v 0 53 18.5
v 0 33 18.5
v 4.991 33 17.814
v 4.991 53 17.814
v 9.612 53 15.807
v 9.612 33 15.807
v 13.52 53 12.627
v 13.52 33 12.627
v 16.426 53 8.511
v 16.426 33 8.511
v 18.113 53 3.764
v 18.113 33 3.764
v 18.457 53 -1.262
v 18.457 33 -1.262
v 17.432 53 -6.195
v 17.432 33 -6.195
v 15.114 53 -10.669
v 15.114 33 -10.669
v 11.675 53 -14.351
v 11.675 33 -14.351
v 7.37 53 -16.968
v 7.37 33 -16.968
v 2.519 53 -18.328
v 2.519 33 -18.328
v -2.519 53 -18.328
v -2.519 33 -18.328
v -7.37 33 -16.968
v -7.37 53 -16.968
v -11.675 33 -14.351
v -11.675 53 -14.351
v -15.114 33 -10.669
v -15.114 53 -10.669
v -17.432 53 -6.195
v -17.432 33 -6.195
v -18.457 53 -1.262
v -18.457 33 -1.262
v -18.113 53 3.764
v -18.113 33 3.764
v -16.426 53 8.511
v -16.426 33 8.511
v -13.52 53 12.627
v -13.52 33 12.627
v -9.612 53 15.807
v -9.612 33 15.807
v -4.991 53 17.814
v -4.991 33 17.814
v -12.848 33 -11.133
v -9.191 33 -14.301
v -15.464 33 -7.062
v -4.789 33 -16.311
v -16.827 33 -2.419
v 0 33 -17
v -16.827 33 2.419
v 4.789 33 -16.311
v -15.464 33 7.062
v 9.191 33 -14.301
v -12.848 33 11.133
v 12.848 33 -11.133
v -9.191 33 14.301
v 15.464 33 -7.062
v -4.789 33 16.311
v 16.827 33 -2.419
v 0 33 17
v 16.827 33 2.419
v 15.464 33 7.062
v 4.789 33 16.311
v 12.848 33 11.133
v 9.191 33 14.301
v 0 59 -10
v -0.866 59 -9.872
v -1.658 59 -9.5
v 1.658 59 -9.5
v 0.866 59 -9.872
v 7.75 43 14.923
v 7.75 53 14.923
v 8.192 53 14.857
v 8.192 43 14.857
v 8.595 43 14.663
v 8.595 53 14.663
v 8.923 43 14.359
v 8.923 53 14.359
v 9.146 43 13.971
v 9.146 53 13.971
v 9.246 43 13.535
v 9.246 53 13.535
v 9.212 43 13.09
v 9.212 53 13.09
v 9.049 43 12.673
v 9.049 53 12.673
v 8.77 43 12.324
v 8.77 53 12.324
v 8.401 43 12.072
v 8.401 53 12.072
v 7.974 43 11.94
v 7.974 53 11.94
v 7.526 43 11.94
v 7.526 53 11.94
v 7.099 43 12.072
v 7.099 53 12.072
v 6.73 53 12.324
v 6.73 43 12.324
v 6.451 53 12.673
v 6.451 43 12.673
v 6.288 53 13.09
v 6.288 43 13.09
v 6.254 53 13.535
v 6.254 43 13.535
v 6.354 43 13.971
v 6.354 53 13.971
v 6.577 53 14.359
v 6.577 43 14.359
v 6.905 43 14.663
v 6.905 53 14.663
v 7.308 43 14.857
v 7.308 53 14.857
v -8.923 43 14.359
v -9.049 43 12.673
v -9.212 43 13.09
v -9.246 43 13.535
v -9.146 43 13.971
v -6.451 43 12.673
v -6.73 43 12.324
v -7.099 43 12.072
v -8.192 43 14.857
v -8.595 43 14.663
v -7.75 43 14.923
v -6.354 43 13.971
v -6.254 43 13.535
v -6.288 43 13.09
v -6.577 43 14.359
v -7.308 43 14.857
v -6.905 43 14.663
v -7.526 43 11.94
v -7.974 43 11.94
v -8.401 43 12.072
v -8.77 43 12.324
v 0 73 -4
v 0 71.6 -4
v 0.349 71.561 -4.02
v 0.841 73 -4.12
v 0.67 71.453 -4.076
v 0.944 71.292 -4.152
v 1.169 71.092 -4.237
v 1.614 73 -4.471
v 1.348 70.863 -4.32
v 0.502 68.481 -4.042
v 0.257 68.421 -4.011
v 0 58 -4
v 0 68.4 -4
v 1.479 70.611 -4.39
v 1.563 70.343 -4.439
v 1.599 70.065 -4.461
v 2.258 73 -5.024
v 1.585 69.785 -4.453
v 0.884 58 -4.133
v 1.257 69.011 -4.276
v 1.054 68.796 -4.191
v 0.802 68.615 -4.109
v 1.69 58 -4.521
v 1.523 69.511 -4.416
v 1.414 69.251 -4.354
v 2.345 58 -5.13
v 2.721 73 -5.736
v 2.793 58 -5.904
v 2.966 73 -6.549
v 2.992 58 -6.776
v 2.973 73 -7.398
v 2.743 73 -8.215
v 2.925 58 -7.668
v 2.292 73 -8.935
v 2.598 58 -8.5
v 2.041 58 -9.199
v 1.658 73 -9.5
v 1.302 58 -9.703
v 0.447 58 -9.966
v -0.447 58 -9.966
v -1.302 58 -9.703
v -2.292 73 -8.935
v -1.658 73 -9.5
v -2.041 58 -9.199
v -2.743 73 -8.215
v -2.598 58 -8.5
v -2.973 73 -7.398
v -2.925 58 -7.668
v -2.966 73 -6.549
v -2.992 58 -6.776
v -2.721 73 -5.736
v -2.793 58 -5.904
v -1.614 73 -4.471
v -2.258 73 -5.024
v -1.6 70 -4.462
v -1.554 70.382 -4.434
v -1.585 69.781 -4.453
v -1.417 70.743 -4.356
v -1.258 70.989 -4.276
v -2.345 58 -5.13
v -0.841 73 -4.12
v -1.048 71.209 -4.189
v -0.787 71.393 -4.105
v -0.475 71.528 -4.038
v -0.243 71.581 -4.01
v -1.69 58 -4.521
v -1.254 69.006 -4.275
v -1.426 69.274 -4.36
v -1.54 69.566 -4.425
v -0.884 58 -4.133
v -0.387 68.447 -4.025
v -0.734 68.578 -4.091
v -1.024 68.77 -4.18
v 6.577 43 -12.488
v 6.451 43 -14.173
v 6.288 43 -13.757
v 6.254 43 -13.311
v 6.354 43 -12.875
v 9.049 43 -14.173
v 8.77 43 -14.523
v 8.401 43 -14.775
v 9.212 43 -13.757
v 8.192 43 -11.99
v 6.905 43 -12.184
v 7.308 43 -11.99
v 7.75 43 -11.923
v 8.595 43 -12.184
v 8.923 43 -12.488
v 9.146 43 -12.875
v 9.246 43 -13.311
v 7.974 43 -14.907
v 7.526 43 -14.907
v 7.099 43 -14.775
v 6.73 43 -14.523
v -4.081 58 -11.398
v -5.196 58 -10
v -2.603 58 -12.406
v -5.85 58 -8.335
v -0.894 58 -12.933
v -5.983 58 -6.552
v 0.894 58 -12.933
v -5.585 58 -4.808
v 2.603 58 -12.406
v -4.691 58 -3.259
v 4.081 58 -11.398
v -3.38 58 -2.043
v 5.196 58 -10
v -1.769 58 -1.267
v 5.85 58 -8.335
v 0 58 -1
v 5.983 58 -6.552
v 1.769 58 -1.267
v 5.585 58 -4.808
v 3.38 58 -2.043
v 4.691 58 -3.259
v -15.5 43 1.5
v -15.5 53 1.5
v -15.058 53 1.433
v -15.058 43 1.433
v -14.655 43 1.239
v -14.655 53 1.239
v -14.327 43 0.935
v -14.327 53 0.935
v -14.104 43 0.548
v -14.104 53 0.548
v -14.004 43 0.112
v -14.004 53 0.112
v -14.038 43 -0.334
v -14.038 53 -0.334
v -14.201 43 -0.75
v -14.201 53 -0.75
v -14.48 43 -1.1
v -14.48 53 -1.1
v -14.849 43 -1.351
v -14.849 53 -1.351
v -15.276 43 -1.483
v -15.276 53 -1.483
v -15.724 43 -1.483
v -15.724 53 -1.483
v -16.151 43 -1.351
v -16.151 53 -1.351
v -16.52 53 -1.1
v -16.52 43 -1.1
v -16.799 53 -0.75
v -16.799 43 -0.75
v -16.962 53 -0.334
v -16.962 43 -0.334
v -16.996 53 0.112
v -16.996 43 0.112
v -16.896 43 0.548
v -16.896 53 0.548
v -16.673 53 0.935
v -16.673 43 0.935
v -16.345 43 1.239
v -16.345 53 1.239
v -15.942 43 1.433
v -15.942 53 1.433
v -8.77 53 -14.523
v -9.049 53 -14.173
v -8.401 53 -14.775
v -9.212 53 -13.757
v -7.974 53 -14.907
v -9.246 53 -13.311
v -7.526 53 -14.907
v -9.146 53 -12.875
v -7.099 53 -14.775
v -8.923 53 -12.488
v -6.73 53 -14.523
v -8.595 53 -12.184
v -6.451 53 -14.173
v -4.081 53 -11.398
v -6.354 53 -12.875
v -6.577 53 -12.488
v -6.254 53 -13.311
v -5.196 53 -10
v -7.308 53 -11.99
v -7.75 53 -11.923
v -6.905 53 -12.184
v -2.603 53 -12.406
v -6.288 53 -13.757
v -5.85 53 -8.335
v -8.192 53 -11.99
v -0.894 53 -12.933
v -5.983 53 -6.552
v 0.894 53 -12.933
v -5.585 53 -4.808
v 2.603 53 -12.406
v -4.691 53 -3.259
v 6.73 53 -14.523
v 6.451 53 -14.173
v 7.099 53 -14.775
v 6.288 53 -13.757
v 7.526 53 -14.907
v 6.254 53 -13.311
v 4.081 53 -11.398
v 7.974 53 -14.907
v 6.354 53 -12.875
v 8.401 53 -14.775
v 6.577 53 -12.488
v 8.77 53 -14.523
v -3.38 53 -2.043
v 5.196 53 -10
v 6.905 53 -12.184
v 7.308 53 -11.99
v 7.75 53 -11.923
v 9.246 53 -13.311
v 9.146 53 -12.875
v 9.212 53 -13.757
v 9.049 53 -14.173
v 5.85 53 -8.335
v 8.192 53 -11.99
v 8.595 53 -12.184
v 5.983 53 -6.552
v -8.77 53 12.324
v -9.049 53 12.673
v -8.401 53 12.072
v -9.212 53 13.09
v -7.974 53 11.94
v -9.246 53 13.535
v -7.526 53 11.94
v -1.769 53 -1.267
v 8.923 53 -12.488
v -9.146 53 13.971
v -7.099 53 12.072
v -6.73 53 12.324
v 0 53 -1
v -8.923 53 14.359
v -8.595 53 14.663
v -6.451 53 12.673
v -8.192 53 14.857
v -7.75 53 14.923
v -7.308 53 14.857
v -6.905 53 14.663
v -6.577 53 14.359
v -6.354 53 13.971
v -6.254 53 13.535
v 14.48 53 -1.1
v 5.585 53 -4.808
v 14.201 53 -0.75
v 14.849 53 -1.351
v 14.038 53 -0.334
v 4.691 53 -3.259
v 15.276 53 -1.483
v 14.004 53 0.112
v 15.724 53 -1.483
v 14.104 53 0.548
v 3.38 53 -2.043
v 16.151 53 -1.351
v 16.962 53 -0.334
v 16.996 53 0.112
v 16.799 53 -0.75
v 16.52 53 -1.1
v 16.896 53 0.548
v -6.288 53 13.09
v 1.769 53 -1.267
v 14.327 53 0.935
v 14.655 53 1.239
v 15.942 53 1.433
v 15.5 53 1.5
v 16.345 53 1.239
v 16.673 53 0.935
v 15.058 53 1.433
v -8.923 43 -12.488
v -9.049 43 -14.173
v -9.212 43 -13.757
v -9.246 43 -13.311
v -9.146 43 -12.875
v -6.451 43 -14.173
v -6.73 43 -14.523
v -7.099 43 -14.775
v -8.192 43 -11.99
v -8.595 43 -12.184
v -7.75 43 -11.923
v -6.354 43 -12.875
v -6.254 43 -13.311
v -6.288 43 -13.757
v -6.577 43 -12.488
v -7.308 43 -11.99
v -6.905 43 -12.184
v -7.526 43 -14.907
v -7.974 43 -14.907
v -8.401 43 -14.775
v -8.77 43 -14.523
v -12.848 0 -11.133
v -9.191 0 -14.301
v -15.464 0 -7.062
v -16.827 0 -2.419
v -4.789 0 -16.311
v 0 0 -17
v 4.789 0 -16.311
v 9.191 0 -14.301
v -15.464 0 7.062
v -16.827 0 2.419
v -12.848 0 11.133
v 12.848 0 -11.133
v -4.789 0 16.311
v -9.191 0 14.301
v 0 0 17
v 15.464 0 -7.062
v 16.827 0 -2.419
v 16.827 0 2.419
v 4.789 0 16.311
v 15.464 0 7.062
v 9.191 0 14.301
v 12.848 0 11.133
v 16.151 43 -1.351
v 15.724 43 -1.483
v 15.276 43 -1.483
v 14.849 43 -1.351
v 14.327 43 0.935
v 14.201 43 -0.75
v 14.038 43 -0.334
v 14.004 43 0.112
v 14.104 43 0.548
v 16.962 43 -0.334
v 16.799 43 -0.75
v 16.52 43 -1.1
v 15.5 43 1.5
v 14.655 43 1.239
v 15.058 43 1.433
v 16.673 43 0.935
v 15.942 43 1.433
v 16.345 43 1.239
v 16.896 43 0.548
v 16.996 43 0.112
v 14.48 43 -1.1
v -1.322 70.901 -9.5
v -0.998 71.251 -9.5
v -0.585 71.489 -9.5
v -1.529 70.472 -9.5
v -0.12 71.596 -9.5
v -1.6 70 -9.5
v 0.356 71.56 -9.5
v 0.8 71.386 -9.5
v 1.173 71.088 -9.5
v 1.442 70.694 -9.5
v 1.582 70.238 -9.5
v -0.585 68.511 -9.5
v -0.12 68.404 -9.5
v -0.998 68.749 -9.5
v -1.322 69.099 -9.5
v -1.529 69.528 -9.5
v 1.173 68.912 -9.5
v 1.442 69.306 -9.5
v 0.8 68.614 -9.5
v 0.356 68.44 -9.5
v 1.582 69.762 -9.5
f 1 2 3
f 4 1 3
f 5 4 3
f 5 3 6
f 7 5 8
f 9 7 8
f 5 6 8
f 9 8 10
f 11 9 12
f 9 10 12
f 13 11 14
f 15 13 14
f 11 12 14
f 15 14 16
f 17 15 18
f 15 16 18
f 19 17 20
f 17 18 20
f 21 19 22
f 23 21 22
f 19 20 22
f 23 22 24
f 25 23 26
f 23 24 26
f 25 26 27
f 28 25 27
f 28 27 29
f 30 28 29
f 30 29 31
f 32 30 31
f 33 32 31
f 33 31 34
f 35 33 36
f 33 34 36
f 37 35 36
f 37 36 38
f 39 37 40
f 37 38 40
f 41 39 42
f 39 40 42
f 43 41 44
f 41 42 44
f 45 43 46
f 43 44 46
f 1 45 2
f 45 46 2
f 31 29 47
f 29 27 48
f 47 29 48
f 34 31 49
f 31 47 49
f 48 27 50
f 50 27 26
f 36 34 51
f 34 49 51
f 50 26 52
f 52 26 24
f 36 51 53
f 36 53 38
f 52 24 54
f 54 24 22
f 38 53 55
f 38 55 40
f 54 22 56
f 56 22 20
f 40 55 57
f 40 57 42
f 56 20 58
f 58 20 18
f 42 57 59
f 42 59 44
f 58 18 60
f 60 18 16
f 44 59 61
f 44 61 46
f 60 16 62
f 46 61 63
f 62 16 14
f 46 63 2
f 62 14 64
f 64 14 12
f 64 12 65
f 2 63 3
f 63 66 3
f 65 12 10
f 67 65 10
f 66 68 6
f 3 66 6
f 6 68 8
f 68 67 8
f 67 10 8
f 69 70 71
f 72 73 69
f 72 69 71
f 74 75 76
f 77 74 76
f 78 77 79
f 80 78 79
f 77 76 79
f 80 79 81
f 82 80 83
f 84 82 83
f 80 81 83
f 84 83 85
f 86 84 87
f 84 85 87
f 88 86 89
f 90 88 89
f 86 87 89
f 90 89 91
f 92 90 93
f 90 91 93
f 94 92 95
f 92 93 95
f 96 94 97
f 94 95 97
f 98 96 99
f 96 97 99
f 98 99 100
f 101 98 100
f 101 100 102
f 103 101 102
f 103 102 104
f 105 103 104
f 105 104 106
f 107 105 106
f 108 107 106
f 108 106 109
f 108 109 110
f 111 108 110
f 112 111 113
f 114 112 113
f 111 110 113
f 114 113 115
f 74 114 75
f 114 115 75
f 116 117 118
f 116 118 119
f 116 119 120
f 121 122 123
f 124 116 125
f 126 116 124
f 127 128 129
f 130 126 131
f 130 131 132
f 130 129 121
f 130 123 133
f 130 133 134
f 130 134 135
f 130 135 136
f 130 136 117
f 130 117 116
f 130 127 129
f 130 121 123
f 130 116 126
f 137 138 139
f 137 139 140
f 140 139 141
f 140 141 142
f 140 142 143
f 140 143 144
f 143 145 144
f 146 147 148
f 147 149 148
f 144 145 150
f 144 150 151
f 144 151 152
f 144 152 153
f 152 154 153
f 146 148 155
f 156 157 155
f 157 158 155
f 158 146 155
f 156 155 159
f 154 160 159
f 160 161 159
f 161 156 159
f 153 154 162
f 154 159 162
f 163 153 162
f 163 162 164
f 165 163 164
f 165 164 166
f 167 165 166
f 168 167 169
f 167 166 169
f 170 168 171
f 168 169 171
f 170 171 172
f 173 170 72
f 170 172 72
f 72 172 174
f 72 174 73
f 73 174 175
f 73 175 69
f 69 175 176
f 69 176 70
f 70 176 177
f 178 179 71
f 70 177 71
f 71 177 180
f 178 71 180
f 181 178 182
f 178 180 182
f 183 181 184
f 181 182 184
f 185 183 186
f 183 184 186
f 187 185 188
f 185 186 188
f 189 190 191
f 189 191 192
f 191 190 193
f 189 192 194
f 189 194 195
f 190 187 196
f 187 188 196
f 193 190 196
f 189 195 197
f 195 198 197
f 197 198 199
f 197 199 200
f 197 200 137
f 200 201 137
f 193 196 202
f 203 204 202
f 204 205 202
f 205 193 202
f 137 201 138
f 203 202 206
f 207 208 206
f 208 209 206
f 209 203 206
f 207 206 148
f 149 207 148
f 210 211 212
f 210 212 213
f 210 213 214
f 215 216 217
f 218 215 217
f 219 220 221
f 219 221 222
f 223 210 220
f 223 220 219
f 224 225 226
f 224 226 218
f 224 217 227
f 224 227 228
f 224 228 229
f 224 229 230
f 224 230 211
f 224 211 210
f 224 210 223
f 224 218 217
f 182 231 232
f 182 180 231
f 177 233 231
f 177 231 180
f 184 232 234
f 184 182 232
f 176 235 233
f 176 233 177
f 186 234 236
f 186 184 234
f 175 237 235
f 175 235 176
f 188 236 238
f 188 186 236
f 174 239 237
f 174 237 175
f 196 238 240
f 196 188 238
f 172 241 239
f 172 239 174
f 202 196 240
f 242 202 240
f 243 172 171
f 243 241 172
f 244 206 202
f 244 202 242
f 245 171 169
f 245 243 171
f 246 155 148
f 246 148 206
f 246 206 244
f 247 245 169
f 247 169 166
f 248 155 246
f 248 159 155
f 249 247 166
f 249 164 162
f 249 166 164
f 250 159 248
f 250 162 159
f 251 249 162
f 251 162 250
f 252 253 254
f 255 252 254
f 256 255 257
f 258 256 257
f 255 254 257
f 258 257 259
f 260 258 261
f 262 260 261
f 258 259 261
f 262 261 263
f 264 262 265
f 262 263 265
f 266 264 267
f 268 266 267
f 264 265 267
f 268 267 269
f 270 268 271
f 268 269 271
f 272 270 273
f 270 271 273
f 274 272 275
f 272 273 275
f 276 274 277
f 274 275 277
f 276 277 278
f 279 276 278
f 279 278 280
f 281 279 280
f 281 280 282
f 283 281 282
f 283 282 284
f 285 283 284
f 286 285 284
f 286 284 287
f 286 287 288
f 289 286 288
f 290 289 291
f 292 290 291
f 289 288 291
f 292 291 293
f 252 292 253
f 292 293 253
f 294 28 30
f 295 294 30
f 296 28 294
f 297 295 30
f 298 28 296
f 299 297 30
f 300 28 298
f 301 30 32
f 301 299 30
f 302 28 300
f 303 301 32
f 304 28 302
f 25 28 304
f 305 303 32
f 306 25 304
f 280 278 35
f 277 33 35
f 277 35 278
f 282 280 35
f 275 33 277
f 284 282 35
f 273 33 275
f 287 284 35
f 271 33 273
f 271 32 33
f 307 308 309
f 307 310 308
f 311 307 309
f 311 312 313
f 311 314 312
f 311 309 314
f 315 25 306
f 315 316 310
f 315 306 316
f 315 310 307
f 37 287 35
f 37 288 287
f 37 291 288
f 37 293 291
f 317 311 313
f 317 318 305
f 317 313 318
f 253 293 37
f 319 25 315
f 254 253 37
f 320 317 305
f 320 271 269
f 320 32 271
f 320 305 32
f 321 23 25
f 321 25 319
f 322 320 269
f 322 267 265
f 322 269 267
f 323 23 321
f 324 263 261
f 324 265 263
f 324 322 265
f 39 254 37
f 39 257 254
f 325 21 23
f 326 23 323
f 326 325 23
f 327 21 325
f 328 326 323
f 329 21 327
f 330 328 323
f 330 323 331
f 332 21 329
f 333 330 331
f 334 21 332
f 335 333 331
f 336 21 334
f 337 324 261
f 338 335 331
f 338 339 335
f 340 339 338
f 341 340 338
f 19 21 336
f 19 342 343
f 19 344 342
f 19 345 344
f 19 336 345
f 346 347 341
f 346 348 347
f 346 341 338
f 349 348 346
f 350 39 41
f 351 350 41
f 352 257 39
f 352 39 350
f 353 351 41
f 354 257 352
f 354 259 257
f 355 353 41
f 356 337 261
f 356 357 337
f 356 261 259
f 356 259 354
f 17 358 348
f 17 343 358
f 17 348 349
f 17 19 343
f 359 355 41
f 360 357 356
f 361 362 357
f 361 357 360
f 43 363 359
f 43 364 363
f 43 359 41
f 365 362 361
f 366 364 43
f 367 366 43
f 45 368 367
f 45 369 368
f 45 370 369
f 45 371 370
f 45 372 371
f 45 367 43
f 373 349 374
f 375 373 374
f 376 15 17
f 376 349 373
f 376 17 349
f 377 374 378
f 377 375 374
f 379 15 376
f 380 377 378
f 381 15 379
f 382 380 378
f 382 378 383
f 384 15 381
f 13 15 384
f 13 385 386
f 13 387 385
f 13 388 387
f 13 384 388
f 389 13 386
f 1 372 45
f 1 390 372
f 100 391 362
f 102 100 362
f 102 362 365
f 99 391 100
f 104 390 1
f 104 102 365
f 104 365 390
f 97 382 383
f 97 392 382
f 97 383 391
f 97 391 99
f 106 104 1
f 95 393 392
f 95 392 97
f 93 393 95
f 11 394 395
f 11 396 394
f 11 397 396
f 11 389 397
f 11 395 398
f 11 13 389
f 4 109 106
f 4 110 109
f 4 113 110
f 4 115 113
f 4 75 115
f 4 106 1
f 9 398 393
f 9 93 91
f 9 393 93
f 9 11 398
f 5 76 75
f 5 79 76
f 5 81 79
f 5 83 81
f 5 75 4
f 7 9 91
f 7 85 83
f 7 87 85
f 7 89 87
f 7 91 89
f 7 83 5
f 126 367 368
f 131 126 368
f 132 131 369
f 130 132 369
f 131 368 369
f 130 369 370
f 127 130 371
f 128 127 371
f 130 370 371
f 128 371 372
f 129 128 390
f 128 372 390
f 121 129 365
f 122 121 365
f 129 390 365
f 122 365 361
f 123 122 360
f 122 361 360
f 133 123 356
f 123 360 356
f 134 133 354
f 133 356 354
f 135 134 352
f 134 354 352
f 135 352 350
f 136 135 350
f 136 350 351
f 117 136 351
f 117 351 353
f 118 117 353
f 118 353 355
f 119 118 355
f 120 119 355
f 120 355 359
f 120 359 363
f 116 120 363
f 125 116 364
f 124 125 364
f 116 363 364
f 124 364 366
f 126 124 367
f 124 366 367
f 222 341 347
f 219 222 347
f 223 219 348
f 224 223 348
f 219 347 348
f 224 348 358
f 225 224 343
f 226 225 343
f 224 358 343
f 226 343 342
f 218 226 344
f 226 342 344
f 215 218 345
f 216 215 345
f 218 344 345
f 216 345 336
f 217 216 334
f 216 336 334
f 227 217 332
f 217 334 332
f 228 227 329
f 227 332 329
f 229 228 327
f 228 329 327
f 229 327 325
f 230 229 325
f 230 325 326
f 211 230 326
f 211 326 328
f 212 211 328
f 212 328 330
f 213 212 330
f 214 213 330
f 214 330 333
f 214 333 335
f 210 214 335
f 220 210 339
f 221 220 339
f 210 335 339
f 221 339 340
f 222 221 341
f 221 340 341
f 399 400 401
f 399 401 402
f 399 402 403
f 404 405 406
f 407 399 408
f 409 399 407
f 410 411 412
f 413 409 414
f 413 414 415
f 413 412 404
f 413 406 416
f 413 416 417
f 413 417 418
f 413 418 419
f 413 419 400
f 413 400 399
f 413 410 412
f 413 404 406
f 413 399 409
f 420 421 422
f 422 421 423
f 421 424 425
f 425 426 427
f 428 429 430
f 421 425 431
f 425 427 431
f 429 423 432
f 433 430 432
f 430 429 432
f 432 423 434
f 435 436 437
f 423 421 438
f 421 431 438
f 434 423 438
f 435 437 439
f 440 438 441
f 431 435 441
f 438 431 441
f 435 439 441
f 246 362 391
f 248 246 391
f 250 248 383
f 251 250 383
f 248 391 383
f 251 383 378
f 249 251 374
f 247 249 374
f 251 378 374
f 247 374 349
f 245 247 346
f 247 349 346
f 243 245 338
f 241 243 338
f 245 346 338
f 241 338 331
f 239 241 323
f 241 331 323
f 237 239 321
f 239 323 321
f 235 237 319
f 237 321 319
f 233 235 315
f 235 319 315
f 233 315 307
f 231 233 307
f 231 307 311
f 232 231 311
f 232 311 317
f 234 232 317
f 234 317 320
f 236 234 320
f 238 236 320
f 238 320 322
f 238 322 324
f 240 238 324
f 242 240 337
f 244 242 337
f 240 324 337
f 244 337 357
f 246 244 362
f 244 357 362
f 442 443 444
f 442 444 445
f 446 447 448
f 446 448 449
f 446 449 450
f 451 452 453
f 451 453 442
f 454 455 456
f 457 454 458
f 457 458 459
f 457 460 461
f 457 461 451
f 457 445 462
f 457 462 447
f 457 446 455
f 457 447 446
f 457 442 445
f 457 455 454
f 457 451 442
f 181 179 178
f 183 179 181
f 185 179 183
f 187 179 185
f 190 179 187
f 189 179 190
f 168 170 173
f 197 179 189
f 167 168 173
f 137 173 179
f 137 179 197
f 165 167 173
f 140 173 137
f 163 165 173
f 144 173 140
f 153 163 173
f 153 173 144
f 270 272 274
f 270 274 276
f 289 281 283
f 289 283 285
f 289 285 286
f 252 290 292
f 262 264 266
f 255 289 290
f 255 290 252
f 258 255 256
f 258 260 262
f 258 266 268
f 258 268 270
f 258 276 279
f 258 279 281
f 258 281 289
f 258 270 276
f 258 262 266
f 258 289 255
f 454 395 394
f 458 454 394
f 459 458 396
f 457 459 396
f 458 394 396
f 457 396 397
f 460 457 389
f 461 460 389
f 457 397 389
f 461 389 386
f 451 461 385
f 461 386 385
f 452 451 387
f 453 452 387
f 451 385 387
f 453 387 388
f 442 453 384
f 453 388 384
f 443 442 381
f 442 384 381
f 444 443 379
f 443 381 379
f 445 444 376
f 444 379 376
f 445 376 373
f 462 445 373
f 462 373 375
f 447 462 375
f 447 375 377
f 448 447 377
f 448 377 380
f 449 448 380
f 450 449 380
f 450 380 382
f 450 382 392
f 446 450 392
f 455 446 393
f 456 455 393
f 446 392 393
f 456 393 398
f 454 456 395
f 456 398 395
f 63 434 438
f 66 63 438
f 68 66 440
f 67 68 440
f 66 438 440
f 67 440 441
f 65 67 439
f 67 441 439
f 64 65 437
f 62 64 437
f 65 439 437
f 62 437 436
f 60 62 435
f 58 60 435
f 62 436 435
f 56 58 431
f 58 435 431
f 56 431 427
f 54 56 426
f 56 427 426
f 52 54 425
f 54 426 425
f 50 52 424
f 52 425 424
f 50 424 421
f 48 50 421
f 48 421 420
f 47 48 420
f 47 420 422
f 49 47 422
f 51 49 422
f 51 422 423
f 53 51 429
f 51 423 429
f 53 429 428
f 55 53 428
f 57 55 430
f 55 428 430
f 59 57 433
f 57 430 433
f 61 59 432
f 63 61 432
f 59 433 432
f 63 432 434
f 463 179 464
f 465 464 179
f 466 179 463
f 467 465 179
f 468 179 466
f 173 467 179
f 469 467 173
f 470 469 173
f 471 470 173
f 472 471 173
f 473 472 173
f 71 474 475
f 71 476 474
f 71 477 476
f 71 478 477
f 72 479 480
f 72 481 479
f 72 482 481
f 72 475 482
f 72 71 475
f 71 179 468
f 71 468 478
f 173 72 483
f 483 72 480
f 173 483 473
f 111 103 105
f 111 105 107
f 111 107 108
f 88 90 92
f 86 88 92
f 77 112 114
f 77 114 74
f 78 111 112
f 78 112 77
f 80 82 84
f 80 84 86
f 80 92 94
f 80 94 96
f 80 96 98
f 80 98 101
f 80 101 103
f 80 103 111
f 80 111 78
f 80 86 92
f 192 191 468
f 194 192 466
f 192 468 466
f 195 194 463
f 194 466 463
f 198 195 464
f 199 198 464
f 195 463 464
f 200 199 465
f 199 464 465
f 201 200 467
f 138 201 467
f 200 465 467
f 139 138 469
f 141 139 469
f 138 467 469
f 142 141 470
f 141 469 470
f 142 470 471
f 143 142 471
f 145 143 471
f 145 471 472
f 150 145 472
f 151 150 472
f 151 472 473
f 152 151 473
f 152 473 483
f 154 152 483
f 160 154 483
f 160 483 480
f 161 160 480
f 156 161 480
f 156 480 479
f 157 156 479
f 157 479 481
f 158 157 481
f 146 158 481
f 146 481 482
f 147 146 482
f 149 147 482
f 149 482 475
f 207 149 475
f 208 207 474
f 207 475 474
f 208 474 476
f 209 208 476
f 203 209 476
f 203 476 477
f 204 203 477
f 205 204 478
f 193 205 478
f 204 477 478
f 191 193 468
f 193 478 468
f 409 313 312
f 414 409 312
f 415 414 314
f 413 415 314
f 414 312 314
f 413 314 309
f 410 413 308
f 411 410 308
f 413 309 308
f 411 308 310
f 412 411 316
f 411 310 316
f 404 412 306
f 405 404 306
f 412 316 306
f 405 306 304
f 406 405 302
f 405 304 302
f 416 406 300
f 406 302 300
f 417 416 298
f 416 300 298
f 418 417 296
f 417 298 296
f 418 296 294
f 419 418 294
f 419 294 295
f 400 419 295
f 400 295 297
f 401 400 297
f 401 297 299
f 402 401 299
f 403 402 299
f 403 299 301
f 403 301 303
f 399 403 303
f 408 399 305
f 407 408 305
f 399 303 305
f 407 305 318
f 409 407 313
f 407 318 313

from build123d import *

# Parameters (mm, degrees)
SKETCH1_R           = 17
BOSS_EXTRUDE1_DEPTH = 33
SKETCH2_R           = 18.5
BOSS_EXTRUDE2_DEPTH = 20
SKETCH3_R           = 6
BOSS_EXTRUDE3_DEPTH = 5
SKETCH4_R           = 3
BOSS_EXTRUDE4_DEPTH = 15
CUT_EXTRUDE1_START  = -14
CUT_EXTRUDE1_DEPTH  = 14
SKETCH6_R           = 1.5
CUT_EXTRUDE2_DEPTH  = 10
SKETCH7_R           = 1.6
CUT_EXTRUDE3_DEPTH  = 10


with BuildPart() as part:
    # Sketch1 → Boss-Extrude1 (new body)
    with BuildSketch(Plane(origin=(0, 0, 0), x_dir=(1, 0, 0), z_dir=(0, 1, 0))):
        with Locations(Location((0, 0, 0), (0, 0, 270))):
            Circle(SKETCH1_R)
    extrude(amount=BOSS_EXTRUDE1_DEPTH)

    # Sketch2 → Boss-Extrude2 (add)
    with BuildSketch(Plane(origin=(0, 33, 0), x_dir=(1, 0, 0), z_dir=(0, 1, 0))):
        with Locations(Location((0, 0, 0), (0, 0, 270))):
            Circle(SKETCH2_R)
    extrude(amount=BOSS_EXTRUDE2_DEPTH)

    # Sketch3 → Boss-Extrude3 (add)
    with BuildSketch(Plane(origin=(0, 53, 0), x_dir=(1, 0, 0), z_dir=(0, 1, 0))):
        with Locations(Location((0, 7, 0), (0, 0, 270))):
            Circle(SKETCH3_R)
    extrude(amount=BOSS_EXTRUDE3_DEPTH)

    # Sketch4 → Boss-Extrude4 (add)
    with BuildSketch(Plane(origin=(0, 58, 0), x_dir=(1, 0, 0), z_dir=(0, 1, 0))):
        with Locations(Location((0, 7, 0), (0, 0, 270))):
            Circle(SKETCH4_R)
    extrude(amount=BOSS_EXTRUDE4_DEPTH)

    # Sketch5 → Cut-Extrude1 (cut)
    with BuildSketch(Plane(origin=(0, 73, 0), x_dir=(1, 0, 0), z_dir=(0, 1, 0)).offset(CUT_EXTRUDE1_START)):
        with BuildLine():
            Line((-1.658312395, 9.5), (1.658312395, 9.5))
            ThreePointArc((1.658312395, 9.5), (0, 10), (-1.658312395, 9.5))
        make_face()
    extrude(amount=CUT_EXTRUDE1_DEPTH, mode=Mode.SUBTRACT)

    # Sketch6 → Cut-Extrude2 (cut)
    with BuildSketch(Plane(origin=(0, 53, 0), x_dir=(1, 0, 0), z_dir=(0, 1, 0))):
        with Locations(Location((15.5, 0, 0), (0, 0, 270))):
            Circle(SKETCH6_R)
        with Locations(Location((-15.5, 0, 0), (0, 0, 270))):
            Circle(SKETCH6_R)
        with Locations(Location((-7.75, -13.423393759, 0), (0, 0, 270))):
            Circle(SKETCH6_R)
        with Locations(Location((7.75, -13.423393759, 0), (0, 0, 270))):
            Circle(SKETCH6_R)
        with Locations(Location((-7.75, 13.423393759, 0), (0, 0, 270))):
            Circle(SKETCH6_R)
        with Locations(Location((7.75, 13.423393759, 0), (0, 0, 270))):
            Circle(SKETCH6_R)
    extrude(amount=-CUT_EXTRUDE2_DEPTH, mode=Mode.SUBTRACT)

    # Sketch7 → Cut-Extrude3 (cut)
    with BuildSketch(Plane(origin=(0, 0, -9.5), x_dir=(-1, 0, 0), z_dir=(0, 0, -1))):
        with Locations((0, 70)):
            Circle(SKETCH7_R)
    extrude(amount=-CUT_EXTRUDE3_DEPTH, mode=Mode.SUBTRACT)


solid = part.part
